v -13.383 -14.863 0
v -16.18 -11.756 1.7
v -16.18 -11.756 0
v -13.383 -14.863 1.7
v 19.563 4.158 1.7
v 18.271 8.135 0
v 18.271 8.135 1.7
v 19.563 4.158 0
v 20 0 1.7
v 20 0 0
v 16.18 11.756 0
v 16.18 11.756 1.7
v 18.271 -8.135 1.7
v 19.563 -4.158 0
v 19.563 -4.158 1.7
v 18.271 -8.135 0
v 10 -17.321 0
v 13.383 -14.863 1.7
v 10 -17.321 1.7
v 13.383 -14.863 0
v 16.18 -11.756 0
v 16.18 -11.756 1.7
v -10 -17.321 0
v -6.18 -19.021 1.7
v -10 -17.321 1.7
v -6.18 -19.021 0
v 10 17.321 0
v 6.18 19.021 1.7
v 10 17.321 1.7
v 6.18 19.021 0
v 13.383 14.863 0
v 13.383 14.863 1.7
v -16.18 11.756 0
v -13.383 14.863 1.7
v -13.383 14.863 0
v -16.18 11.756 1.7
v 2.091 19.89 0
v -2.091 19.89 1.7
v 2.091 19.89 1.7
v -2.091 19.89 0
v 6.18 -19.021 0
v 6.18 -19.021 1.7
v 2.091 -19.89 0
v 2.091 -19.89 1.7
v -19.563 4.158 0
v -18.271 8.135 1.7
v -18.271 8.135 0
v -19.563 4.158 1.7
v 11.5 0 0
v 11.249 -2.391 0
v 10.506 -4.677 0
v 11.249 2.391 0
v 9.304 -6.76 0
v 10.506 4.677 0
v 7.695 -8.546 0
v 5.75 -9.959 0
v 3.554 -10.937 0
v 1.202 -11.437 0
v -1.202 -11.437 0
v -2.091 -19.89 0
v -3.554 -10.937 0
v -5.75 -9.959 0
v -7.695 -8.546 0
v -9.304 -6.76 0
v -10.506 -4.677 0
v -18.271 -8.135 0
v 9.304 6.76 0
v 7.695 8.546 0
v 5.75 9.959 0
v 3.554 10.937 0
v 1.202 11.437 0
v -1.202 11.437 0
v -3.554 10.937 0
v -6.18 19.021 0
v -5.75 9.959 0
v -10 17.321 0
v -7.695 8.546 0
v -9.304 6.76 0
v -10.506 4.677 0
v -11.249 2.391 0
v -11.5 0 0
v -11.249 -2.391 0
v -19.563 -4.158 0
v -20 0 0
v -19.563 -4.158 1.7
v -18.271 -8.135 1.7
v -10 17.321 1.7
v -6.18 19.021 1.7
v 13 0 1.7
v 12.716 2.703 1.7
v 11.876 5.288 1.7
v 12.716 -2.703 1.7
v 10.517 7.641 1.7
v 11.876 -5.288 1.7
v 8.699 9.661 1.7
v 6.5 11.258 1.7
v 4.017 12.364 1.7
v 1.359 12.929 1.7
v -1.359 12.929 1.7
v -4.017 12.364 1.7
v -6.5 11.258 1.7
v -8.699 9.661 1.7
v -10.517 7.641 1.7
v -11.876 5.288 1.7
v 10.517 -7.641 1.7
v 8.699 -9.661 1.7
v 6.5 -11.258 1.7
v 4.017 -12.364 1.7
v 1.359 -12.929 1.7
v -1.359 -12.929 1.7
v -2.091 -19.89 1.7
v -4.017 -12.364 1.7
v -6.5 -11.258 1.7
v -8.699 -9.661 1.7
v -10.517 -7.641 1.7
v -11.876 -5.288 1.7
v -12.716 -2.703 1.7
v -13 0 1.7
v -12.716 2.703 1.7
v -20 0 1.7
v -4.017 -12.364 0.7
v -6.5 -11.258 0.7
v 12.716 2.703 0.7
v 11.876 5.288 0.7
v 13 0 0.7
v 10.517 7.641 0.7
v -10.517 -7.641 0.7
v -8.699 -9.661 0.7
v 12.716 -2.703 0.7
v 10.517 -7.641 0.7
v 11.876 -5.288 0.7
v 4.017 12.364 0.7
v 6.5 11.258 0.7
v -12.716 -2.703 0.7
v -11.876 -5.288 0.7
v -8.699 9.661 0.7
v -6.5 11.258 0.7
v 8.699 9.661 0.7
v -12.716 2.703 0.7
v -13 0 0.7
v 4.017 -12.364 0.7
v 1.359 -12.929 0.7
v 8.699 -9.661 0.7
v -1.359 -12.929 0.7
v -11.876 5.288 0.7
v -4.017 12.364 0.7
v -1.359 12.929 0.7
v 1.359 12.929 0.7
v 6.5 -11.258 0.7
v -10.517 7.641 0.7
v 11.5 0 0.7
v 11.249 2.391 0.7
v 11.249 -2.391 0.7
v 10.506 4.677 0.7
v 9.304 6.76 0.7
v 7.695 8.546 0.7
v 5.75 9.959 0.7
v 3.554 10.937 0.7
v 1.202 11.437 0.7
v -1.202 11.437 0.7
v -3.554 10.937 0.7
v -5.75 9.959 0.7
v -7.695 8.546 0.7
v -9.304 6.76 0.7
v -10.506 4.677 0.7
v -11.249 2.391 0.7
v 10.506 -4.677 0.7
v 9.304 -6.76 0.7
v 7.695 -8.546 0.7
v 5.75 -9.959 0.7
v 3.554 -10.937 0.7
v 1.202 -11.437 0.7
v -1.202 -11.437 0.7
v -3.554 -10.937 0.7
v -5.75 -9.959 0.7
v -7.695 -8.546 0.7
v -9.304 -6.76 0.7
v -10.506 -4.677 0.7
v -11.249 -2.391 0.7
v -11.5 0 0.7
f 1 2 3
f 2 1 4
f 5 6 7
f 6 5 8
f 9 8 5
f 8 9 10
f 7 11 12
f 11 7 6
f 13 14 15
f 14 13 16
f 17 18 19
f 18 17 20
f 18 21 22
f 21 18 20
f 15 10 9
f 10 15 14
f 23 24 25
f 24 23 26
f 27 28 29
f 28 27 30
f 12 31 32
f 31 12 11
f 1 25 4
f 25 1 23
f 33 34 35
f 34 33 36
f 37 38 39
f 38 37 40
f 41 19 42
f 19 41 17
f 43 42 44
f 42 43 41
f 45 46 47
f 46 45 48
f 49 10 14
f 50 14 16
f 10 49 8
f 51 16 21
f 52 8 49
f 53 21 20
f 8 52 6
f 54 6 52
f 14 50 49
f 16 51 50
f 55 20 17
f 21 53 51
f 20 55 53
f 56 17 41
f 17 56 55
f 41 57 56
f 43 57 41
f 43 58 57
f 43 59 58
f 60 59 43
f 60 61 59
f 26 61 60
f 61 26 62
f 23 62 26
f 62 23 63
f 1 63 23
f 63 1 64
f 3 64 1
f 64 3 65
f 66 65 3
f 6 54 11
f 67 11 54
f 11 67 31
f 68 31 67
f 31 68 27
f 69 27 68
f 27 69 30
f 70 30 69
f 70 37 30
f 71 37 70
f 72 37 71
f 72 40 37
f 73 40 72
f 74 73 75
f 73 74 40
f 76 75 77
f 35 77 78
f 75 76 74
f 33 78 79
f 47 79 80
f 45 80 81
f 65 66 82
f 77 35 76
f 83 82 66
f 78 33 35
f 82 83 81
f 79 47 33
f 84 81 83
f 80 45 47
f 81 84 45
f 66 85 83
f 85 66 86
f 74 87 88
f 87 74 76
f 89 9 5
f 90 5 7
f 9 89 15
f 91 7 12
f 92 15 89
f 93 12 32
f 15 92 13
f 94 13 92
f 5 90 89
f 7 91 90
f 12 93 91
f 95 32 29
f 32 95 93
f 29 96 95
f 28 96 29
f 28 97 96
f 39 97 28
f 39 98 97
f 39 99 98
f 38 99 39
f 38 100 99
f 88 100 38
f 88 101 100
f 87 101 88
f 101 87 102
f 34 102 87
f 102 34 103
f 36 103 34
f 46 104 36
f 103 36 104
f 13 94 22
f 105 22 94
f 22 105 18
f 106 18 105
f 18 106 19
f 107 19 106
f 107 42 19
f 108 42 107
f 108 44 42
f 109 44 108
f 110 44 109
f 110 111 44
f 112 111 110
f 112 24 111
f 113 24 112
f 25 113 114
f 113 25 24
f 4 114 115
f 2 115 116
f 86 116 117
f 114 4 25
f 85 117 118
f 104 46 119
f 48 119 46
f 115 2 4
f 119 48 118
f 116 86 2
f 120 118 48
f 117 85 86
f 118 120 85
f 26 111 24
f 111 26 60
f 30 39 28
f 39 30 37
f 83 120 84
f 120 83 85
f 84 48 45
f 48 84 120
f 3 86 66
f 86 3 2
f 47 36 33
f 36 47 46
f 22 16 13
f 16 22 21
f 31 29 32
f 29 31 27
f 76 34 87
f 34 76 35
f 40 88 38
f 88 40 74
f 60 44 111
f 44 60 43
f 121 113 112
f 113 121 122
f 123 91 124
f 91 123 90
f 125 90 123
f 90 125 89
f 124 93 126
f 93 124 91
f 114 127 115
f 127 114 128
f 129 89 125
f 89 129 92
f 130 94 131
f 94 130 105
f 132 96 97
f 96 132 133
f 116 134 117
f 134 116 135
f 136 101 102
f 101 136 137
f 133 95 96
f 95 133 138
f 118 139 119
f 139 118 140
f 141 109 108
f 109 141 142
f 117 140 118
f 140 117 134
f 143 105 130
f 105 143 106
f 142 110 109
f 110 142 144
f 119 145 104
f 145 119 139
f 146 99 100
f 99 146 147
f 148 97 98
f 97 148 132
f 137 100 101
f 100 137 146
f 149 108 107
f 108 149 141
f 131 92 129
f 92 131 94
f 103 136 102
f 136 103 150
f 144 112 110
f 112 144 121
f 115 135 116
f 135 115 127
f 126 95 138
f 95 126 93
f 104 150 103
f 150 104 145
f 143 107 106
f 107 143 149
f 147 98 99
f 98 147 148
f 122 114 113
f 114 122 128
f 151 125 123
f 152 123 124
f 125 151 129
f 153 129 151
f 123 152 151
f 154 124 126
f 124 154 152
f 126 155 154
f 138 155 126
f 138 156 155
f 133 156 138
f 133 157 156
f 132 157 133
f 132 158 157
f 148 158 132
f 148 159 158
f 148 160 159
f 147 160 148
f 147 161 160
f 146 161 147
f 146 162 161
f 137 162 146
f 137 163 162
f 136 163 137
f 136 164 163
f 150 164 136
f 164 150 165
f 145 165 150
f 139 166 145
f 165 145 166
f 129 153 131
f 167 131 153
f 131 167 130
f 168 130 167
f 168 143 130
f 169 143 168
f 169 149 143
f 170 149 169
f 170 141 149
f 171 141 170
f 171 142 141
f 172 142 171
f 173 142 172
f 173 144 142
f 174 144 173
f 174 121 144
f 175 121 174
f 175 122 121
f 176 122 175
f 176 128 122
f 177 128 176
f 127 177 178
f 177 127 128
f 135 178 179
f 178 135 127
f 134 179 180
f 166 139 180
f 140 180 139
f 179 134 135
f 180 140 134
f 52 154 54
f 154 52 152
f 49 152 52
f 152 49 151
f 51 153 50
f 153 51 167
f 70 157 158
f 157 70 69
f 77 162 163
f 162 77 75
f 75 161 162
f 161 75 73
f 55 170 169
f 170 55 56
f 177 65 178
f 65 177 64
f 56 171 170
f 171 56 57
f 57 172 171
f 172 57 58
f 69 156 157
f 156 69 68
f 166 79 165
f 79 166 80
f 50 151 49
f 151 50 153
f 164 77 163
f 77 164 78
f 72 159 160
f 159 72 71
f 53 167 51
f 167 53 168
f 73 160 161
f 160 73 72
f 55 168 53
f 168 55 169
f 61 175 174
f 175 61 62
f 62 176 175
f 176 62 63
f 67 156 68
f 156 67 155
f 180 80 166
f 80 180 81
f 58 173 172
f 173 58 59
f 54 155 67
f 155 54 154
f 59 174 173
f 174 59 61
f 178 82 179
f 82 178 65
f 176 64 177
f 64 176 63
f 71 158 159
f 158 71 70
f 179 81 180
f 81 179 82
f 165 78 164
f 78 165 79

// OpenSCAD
// Very simple adapter to hold a 1 inch disc on the microscope
// This is useful if you've got a 1 inch calibration target.
// This file is CC-0 public domain.

difference(){
    cylinder(d=40,h=1.7);

    translate([0,0,0.7]){
        cylinder(d=26,h=999);
    }
    cylinder(d=23, h=999, center=true);
}
